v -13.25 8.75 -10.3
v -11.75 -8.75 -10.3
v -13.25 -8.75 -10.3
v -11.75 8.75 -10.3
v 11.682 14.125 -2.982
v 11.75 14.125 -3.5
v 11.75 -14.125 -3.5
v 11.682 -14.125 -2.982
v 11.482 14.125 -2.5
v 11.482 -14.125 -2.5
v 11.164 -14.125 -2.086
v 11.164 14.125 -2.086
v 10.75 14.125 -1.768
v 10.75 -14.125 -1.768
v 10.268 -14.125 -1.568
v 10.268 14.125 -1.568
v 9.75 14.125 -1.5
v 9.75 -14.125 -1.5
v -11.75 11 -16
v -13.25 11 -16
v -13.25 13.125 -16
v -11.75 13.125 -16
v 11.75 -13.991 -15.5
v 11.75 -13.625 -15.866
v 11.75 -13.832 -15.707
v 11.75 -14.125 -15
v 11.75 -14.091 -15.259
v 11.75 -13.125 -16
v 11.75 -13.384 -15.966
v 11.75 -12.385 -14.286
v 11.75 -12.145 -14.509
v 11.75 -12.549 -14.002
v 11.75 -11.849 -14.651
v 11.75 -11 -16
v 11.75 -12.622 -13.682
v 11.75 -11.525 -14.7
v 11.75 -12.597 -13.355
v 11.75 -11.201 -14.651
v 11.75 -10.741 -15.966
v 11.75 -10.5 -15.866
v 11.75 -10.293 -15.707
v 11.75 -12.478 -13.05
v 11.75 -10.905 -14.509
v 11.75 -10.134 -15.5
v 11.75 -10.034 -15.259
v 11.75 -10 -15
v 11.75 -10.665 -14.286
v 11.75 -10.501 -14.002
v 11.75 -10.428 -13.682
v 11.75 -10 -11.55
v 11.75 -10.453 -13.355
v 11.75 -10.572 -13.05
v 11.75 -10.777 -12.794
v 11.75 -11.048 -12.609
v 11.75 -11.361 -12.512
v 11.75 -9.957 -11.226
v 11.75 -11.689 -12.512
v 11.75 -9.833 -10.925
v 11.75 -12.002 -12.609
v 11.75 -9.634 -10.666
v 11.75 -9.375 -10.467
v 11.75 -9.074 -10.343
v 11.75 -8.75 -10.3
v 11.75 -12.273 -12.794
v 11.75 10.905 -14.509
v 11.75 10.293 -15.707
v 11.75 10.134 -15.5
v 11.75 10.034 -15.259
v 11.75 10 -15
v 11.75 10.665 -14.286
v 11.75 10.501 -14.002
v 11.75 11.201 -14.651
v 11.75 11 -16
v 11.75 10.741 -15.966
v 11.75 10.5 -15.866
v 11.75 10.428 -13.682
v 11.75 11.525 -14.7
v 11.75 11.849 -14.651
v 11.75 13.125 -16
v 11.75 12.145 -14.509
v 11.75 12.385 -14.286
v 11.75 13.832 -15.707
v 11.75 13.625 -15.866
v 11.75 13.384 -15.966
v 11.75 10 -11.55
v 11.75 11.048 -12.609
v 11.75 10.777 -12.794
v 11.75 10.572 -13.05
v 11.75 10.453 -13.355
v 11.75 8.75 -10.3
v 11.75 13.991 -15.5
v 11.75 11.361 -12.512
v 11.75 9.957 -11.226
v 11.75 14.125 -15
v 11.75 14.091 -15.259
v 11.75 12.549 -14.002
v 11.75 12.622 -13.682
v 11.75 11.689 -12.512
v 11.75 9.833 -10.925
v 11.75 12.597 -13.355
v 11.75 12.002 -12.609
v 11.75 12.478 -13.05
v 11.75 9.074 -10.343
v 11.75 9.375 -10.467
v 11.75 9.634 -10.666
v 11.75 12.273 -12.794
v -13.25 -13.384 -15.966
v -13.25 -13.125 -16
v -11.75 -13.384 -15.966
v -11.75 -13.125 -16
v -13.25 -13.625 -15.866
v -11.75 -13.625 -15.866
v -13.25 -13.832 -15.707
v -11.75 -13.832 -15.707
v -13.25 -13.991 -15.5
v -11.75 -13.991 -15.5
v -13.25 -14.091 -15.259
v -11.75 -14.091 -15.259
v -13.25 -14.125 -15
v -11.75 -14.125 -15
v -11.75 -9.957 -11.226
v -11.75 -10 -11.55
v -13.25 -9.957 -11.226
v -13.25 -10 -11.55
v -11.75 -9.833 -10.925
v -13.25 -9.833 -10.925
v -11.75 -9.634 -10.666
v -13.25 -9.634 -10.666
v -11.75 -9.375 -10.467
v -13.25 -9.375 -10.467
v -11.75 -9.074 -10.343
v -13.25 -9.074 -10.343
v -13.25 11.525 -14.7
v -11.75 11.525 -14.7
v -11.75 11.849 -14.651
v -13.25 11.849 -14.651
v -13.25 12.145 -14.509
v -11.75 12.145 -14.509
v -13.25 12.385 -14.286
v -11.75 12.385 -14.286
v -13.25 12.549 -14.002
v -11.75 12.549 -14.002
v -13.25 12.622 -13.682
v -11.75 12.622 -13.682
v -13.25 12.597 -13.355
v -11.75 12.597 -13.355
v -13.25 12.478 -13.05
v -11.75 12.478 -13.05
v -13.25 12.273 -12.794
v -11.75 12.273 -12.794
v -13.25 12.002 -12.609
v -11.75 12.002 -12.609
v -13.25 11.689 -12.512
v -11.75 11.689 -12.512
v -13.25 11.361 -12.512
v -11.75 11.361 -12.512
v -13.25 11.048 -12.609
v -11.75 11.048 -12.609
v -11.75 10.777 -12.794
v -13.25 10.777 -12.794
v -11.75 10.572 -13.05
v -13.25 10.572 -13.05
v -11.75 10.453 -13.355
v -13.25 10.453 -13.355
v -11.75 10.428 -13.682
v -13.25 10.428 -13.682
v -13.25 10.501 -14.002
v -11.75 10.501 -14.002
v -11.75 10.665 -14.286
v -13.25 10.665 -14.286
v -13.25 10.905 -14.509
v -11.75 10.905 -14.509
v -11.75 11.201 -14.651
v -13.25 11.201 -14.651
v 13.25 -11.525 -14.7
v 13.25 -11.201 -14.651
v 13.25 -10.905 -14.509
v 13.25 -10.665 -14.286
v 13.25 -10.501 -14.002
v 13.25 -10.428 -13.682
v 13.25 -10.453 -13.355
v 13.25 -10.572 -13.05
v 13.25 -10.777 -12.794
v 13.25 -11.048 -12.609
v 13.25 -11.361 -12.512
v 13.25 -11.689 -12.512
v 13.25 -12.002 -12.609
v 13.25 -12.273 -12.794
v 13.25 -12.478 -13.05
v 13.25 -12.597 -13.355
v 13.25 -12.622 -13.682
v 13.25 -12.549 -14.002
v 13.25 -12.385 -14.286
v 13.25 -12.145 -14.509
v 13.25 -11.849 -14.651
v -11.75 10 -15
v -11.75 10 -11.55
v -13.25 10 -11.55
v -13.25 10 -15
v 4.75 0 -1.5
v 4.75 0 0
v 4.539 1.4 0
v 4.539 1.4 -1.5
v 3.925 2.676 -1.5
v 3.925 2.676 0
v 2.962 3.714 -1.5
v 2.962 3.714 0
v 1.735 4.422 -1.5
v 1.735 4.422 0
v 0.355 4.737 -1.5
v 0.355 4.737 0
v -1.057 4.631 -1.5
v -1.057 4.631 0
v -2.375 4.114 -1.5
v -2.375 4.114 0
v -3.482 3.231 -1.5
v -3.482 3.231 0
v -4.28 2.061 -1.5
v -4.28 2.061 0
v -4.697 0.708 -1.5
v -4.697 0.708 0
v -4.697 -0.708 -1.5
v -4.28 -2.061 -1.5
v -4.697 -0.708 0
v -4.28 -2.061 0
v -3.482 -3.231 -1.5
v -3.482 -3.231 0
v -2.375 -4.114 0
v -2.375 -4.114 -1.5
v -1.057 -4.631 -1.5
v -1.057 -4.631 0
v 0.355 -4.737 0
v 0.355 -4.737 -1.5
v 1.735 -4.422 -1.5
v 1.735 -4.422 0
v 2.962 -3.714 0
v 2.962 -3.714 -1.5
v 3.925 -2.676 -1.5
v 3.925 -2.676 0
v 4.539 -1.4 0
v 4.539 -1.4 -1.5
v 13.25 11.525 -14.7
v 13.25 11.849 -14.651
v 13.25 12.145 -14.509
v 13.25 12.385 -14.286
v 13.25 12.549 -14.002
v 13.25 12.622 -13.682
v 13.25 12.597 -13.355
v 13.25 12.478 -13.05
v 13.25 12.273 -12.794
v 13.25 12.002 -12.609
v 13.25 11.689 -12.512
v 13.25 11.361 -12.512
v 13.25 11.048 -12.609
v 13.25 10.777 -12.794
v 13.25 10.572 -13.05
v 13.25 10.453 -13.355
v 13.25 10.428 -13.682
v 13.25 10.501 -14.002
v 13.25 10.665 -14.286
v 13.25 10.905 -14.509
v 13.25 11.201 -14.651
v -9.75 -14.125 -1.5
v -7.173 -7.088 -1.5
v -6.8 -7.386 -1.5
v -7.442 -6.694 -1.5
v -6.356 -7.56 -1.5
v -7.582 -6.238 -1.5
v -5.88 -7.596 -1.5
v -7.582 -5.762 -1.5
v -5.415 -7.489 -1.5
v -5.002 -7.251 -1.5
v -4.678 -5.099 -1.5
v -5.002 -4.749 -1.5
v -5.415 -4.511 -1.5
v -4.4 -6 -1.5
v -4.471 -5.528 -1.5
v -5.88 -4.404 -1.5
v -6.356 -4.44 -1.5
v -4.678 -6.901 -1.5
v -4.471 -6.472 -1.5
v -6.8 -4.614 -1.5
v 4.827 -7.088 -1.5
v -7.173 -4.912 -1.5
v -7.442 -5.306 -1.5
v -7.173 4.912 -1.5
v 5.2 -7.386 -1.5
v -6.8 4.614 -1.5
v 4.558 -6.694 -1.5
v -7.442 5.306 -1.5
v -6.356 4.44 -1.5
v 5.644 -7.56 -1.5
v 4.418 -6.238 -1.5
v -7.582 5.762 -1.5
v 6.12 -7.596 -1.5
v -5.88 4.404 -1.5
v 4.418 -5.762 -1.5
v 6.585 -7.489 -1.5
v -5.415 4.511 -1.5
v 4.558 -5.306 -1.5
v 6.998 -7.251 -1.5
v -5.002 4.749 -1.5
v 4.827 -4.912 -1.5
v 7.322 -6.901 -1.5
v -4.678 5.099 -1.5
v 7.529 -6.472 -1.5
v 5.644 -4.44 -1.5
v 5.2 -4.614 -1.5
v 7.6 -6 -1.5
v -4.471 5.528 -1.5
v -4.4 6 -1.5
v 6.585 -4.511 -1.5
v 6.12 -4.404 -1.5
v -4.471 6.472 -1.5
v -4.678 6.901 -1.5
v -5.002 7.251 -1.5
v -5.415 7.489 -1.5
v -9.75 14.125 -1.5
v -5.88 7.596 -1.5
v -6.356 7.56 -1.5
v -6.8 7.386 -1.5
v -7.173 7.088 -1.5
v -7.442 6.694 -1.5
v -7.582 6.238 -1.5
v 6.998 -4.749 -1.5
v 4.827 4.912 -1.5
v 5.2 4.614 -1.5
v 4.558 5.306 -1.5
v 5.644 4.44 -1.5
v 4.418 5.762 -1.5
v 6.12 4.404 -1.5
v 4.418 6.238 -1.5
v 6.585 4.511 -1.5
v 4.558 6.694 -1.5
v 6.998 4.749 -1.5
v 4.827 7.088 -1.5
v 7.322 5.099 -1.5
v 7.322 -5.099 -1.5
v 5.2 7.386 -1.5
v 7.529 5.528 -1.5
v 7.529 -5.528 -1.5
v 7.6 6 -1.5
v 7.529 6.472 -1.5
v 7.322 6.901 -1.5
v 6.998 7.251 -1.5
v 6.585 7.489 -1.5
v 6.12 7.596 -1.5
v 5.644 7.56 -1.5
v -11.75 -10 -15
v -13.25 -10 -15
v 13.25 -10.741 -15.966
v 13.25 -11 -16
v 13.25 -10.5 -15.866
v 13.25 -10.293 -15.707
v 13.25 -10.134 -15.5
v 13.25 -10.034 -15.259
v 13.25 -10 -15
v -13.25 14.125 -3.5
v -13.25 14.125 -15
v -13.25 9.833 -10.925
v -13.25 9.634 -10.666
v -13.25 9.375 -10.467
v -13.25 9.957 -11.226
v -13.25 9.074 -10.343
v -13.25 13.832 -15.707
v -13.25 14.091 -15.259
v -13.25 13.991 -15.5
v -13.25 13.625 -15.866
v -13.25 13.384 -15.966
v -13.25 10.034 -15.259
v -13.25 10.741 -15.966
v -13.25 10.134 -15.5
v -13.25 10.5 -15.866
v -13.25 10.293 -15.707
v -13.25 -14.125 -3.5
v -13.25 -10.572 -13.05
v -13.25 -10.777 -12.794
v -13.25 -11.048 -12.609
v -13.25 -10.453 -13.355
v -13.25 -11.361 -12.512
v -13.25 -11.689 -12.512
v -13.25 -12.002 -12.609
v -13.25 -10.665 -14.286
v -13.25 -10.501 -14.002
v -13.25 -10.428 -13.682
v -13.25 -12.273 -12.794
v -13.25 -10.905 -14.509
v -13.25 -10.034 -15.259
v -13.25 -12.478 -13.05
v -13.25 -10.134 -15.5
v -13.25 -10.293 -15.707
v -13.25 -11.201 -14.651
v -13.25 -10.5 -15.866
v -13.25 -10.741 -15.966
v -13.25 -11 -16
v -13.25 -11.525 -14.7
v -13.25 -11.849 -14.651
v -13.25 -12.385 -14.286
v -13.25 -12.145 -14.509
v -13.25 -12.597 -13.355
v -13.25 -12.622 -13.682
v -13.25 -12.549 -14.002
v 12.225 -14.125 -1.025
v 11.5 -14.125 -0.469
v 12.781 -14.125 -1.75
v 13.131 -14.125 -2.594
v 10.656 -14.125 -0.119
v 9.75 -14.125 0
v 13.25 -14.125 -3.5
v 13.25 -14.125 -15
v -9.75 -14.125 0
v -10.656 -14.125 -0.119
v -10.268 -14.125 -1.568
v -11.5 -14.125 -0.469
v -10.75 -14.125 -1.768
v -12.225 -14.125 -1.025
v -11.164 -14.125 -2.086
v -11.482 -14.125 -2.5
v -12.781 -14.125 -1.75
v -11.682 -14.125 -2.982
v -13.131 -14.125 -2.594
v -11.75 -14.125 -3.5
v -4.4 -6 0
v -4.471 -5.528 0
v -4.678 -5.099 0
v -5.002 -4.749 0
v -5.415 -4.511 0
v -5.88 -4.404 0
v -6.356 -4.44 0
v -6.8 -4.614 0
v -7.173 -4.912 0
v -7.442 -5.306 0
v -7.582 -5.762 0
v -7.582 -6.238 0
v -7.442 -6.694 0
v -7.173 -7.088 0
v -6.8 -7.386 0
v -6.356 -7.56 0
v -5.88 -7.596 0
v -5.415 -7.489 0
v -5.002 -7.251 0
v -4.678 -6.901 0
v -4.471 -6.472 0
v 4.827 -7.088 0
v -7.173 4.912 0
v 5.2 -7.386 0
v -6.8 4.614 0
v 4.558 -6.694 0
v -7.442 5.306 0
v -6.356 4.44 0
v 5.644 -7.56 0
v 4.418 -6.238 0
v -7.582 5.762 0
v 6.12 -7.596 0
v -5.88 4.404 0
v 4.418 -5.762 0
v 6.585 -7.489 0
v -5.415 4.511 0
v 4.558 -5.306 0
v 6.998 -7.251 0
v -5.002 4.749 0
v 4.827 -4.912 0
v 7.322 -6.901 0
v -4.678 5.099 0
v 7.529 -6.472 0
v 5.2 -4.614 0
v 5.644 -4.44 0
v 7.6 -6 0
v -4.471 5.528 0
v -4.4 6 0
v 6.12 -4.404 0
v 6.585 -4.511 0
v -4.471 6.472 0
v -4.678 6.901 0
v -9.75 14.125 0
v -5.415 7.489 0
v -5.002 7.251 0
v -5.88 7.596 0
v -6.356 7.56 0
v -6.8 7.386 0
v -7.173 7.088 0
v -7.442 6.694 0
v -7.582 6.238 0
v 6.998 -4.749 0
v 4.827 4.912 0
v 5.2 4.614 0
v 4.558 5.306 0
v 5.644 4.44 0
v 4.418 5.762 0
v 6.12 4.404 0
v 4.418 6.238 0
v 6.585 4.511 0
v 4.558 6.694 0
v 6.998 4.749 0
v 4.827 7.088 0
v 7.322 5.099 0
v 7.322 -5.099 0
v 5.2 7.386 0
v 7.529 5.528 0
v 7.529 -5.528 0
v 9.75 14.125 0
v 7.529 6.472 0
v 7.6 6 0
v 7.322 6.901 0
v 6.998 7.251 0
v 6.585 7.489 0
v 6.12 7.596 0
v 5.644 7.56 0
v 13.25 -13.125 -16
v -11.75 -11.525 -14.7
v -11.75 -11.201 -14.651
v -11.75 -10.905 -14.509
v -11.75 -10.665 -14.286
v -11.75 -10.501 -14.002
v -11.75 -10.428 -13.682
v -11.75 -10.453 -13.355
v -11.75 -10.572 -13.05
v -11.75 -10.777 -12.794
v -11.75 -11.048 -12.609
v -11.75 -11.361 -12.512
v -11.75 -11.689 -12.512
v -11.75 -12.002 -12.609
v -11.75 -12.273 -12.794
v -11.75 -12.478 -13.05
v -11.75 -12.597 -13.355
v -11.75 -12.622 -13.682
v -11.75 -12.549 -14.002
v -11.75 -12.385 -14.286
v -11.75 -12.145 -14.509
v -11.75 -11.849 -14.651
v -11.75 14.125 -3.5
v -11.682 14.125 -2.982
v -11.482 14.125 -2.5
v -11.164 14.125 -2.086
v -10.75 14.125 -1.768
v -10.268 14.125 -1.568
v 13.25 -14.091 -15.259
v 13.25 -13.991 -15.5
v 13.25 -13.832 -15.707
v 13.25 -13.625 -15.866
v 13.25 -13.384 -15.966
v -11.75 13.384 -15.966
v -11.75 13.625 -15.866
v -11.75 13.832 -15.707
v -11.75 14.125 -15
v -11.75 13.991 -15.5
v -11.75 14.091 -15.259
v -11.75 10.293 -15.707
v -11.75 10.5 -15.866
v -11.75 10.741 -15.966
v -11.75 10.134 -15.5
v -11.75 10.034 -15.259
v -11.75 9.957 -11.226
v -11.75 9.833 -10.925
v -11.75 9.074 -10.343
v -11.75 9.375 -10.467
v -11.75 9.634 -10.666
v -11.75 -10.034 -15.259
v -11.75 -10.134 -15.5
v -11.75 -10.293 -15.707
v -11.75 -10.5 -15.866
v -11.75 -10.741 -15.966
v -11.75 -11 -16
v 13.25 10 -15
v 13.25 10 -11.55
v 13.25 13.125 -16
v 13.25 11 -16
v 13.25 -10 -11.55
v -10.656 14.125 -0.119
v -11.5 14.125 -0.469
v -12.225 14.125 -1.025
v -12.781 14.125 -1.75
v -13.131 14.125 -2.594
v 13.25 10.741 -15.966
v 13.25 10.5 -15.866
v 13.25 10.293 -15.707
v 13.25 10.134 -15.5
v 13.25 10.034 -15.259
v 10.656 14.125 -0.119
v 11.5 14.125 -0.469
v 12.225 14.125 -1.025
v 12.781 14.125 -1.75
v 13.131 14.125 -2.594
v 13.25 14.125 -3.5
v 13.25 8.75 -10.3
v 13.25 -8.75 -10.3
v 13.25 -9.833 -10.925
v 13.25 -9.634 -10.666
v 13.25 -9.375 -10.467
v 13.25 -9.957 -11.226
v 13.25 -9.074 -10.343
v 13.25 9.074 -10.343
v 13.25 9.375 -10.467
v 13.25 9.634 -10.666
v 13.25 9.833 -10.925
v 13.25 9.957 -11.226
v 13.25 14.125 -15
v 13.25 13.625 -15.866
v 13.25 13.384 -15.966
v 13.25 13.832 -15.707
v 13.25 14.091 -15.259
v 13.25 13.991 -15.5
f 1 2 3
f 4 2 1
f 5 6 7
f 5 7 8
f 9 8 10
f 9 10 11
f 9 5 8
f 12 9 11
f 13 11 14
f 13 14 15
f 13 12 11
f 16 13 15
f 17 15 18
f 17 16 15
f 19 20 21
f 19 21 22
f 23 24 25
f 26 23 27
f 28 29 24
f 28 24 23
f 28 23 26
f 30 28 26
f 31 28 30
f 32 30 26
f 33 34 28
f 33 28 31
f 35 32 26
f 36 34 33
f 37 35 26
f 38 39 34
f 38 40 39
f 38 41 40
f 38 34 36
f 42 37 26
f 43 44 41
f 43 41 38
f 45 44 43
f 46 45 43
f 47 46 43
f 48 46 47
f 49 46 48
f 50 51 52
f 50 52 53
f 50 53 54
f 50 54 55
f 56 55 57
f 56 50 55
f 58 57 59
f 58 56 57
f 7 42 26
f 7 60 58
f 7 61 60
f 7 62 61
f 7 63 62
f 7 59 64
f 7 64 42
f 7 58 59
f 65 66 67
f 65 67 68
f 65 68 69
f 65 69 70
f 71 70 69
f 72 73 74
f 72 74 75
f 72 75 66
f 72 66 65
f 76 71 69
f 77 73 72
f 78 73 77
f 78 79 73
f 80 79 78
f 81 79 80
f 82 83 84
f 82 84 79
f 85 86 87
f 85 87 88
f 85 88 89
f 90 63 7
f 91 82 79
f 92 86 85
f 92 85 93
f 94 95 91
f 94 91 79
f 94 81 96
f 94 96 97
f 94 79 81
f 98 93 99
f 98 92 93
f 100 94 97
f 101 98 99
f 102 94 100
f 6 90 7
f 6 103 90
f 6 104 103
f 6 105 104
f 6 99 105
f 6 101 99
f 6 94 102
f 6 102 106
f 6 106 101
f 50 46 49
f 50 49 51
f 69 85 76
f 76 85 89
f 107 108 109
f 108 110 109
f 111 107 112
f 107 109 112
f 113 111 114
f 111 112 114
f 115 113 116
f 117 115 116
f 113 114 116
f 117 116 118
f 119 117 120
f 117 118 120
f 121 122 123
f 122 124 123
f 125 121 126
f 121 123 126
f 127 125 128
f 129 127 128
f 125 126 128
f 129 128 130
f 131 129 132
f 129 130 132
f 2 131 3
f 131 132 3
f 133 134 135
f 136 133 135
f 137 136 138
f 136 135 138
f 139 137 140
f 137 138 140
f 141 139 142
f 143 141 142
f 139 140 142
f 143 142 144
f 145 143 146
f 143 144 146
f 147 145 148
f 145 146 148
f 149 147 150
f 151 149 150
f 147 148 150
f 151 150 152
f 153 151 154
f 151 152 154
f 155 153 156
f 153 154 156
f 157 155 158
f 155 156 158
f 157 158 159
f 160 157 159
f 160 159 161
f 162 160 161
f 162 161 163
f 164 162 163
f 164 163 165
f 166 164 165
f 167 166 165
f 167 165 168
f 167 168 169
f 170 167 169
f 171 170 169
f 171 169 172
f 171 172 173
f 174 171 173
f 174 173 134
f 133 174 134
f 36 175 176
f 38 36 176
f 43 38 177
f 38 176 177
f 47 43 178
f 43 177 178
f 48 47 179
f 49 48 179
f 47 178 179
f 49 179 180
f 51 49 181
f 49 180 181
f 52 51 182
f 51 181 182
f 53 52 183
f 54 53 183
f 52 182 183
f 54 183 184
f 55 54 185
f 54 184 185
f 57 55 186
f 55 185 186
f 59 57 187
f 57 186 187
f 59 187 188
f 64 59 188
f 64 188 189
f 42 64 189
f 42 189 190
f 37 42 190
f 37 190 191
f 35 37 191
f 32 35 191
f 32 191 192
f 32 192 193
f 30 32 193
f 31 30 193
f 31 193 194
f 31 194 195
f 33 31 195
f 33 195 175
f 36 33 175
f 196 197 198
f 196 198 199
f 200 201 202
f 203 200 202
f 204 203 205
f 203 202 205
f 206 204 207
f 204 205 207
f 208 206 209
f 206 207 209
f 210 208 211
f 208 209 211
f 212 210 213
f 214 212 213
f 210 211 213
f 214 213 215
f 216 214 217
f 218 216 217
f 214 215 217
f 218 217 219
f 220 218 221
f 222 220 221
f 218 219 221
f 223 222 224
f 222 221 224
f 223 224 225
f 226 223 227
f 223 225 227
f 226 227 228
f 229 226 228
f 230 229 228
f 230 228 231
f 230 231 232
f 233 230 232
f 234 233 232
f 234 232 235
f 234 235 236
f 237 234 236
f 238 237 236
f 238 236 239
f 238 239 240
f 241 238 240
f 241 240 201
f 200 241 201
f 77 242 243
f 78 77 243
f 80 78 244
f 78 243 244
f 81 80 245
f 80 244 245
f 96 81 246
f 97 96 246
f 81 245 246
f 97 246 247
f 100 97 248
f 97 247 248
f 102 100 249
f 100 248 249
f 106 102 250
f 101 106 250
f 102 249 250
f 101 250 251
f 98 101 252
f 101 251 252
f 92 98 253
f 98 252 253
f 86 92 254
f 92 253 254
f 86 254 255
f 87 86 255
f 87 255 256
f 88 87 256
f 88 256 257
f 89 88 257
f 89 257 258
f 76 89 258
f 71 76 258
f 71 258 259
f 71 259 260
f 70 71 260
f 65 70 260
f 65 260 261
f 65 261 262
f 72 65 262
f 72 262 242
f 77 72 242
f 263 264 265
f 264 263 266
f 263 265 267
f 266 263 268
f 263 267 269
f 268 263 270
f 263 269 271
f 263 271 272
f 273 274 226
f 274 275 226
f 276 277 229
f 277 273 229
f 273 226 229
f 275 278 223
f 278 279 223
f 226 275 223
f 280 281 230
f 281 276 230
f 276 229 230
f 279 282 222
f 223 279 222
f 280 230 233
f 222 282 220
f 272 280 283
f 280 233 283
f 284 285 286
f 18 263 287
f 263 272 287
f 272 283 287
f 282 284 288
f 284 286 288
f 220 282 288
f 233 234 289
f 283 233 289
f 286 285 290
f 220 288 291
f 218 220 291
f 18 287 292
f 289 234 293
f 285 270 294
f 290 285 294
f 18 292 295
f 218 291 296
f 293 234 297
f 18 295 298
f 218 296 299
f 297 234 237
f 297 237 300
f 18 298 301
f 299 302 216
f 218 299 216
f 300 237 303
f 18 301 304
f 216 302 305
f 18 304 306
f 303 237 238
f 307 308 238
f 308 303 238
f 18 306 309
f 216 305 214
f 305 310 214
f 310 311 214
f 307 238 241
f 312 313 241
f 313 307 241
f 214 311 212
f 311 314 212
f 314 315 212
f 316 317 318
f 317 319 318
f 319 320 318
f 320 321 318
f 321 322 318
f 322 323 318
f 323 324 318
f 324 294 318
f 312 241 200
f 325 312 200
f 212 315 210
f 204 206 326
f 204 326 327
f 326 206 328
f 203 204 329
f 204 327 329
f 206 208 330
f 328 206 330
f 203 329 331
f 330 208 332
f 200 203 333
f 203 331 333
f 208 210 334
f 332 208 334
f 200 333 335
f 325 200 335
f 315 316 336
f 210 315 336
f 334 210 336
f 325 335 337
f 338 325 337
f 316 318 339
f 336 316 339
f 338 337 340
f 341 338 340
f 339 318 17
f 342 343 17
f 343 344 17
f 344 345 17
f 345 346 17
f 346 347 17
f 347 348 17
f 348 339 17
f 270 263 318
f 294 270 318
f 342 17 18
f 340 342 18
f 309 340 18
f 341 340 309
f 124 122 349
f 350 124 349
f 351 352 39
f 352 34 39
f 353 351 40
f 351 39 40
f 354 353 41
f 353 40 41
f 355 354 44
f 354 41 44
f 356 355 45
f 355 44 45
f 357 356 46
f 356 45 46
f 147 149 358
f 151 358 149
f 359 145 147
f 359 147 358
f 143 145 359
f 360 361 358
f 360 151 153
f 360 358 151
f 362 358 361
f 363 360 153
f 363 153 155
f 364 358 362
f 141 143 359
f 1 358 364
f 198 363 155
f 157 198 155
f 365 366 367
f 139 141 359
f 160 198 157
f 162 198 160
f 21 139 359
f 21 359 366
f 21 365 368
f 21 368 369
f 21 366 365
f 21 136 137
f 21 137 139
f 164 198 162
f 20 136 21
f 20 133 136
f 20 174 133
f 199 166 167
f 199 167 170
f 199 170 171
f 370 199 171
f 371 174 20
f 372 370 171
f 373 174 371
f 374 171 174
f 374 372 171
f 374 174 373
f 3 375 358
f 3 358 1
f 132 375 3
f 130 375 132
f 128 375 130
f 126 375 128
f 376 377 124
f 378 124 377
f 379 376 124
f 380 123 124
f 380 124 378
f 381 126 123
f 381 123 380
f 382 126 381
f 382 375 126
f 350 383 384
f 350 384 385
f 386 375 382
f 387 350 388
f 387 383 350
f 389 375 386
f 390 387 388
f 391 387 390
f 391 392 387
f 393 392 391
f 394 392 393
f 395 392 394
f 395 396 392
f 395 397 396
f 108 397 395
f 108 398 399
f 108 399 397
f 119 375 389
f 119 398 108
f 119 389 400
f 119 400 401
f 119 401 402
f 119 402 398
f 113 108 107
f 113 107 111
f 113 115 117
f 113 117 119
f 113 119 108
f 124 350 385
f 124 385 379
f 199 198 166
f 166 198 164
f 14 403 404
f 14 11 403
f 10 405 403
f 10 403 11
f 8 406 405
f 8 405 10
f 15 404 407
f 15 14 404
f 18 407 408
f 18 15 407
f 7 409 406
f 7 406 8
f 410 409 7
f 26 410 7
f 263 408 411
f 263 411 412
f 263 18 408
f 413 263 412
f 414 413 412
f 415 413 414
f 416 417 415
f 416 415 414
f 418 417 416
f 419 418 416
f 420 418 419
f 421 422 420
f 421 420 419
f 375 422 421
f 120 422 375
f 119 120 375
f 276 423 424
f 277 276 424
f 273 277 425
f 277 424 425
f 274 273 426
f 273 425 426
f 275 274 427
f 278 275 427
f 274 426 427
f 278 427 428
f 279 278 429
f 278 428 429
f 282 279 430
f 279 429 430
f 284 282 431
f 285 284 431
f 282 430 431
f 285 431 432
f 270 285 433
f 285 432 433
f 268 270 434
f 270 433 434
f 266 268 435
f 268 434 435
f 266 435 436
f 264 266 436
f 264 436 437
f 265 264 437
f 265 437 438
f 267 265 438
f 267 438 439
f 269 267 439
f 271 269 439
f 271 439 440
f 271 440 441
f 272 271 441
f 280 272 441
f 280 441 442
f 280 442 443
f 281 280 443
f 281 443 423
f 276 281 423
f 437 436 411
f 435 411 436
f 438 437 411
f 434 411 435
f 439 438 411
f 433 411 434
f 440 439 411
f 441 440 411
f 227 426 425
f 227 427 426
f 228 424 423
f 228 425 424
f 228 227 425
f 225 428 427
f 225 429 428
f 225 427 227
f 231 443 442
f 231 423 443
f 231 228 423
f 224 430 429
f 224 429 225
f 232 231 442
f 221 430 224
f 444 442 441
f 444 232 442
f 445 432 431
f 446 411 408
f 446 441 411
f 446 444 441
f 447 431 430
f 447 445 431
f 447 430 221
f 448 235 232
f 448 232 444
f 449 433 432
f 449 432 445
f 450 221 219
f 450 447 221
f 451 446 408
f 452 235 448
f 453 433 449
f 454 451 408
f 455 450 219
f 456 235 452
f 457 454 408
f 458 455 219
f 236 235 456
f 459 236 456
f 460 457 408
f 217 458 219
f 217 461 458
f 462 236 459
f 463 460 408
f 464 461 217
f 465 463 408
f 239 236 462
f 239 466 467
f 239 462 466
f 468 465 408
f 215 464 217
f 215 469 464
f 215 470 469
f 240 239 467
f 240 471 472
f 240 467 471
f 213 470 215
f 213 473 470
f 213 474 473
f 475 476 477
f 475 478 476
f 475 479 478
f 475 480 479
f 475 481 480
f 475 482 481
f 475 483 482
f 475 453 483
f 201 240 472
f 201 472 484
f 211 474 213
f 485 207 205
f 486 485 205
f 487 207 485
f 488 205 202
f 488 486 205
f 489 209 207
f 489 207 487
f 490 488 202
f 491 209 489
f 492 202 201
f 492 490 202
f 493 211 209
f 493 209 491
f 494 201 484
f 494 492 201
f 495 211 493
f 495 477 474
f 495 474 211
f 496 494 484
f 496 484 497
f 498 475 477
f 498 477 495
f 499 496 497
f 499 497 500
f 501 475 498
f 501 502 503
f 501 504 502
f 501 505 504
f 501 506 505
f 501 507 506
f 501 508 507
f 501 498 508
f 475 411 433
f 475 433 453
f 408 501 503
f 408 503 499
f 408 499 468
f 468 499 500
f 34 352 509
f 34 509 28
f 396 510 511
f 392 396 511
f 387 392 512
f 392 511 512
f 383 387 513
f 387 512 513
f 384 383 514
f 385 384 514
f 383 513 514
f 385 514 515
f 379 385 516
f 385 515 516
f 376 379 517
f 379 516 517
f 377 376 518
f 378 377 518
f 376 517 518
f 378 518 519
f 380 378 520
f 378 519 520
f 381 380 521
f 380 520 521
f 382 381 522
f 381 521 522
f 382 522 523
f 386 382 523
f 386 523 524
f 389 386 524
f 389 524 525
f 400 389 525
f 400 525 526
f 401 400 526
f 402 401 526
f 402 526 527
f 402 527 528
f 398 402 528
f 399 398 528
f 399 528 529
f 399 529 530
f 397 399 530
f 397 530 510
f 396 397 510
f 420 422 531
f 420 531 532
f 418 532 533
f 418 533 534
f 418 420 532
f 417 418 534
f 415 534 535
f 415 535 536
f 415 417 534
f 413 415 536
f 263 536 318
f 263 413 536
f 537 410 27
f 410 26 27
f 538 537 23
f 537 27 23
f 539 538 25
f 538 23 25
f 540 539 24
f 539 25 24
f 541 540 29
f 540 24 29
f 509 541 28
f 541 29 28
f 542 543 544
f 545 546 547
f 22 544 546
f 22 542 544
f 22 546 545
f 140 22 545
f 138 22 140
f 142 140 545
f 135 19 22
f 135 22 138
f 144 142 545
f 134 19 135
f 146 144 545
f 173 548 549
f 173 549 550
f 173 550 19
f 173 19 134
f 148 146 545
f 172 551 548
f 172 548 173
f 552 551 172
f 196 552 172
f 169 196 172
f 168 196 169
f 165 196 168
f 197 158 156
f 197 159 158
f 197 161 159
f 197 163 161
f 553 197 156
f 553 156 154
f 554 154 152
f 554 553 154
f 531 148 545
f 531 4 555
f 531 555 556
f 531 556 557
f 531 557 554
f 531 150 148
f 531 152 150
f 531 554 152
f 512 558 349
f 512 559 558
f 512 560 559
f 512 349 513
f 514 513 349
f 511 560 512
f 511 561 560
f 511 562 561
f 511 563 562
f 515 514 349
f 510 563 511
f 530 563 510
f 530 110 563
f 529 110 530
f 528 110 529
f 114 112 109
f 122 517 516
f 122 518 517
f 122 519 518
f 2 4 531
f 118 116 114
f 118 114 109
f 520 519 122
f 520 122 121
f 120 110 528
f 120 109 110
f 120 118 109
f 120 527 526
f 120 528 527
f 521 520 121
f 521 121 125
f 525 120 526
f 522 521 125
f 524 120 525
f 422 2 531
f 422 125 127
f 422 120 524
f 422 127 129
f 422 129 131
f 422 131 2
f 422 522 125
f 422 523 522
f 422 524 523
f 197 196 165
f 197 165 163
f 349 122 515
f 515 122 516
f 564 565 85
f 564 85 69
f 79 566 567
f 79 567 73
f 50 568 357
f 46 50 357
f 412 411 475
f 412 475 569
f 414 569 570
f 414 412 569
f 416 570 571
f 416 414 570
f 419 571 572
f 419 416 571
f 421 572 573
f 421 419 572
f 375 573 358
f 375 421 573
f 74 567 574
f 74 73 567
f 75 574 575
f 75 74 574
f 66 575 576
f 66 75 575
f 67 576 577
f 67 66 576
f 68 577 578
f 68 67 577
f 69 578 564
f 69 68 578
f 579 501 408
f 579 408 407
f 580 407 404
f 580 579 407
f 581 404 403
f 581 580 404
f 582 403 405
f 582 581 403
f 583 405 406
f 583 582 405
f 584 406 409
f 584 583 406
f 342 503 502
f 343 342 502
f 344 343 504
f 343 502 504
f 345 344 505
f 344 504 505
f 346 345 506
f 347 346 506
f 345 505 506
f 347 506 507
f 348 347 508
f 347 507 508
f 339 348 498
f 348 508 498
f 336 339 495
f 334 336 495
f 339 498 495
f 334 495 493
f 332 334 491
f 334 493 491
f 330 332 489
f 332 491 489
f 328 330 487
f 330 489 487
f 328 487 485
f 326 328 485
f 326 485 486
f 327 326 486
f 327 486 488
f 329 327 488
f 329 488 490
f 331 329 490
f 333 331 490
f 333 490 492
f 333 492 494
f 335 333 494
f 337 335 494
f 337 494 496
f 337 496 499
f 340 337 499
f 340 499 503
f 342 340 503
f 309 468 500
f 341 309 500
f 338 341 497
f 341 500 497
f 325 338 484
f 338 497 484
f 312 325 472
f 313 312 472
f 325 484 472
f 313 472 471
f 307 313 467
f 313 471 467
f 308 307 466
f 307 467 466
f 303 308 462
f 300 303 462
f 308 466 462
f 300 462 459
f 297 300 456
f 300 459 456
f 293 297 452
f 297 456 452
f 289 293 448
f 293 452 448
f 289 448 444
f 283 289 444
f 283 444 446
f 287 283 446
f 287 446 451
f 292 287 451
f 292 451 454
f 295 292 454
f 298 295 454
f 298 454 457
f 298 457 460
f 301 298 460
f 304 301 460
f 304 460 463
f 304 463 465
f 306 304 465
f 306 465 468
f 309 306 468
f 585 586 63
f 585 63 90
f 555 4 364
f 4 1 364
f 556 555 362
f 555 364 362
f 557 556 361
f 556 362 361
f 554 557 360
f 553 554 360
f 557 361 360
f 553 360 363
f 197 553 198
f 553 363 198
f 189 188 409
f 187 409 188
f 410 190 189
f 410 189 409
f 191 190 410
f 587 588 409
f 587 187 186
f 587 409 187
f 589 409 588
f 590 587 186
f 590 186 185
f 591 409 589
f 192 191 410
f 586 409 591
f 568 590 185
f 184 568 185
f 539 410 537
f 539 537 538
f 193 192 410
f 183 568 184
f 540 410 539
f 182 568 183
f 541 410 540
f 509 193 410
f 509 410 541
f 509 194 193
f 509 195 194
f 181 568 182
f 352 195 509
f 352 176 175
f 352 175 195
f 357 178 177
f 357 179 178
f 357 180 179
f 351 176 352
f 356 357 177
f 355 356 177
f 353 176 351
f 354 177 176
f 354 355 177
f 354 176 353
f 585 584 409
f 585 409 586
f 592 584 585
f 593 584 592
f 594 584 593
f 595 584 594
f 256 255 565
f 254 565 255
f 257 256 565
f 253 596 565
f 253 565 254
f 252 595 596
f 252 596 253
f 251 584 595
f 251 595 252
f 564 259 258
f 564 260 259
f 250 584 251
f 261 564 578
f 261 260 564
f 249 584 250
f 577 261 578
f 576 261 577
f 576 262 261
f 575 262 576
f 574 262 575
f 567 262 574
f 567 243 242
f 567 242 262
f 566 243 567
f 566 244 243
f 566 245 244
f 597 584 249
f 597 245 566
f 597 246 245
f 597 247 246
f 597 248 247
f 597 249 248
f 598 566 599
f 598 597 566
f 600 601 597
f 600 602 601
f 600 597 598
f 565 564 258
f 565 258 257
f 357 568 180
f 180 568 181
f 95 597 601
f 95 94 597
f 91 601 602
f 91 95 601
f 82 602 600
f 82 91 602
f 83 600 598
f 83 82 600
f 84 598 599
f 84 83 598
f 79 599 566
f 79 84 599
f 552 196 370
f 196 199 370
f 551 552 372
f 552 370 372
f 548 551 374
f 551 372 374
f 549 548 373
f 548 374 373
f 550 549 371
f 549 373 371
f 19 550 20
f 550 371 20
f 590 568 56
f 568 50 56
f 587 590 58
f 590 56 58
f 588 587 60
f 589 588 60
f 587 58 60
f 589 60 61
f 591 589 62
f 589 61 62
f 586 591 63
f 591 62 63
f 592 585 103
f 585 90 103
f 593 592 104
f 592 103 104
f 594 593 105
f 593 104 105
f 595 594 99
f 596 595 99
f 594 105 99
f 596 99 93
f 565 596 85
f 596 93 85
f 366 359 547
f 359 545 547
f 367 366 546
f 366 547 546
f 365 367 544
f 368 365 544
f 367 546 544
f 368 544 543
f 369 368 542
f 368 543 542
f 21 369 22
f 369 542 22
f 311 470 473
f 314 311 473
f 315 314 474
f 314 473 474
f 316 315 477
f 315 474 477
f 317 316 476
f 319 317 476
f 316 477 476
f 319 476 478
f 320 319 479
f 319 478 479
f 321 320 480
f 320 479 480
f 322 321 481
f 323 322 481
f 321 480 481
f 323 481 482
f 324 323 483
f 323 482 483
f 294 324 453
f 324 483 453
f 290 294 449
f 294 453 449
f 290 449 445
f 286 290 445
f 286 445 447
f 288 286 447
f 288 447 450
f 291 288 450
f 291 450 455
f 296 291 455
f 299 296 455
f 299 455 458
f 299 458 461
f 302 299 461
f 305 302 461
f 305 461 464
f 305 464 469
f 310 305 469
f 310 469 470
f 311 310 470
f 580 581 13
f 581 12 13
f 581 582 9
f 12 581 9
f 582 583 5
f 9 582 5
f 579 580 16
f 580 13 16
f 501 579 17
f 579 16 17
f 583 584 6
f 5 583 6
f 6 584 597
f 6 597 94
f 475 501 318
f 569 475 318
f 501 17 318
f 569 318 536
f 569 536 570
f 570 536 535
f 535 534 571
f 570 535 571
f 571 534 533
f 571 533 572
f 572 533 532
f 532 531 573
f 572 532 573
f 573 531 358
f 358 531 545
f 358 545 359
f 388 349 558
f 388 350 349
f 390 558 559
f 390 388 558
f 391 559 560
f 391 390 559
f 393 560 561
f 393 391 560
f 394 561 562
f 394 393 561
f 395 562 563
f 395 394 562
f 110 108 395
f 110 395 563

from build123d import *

# Parameters (mm, degrees)
SKETCH1_W                      = 23.5
SKETCH1_H                      = 28.25
BASE_FLANGE1_DEPTH             = 1.5
EDGE_FLANGE1_STRIP_W           = 10
EDGE_FLANGE1_STRIP_H           = 1.5
EDGE_FLANGE1_STRIP_CUT_DEPTH   = 28.25
EDGE_FLANGE1_STRIP_2_W         = 10
EDGE_FLANGE1_STRIP_2_H         = 1.5
EDGE_FLANGE1_STRIP_CUT_2_DEPTH = 28.25
EDGE_FLANGE1_DEPTH             = 28.25
EDGE_FLANGE1_BEND_DEPTH        = 28.25
SKETCH12_R                     = 1.6
SKETCH12_R_2                   = 4.75
CUT_EXTRUDE1_DEPTH             = 26.12126838
SKETCH13_R                     = 1.1
SKETCH13_W                     = 29.65
SKETCH13_H                     = 20
CUT_EXTRUDE2_DEPTH             = 35.025955167
FILLET1_R                      = 1.25
FILLET2_R                      = 1


# Sheet-metal steps are written as plain solids
with BuildPart() as part:
    # Sketch1 → Base-Flange1 (new body)
    with BuildSketch(Plane.XY):
        Rectangle(SKETCH1_W, SKETCH1_H)
    extrude(amount=-BASE_FLANGE1_DEPTH)

    # Edge-Flange1 strip (across the edge) → Edge-Flange1 strip cut (cut)
    with BuildSketch(Plane(origin=(11.75, 14.125, -1.5), x_dir=(-1, 0, 0), z_dir=(0, -1, 0))):
        with Locations((-3, -0.75)):
            Rectangle(EDGE_FLANGE1_STRIP_W, EDGE_FLANGE1_STRIP_H)
    extrude(amount=EDGE_FLANGE1_STRIP_CUT_DEPTH, mode=Mode.SUBTRACT)

    # Edge-Flange1 strip 2 (across the edge) → Edge-Flange1 strip cut 2 (cut)
    with BuildSketch(Plane(origin=(-11.75, -14.125, -1.5), x_dir=(1, 0, 0), z_dir=(0, 1, 0))):
        with Locations((-3, -0.75)):
            Rectangle(EDGE_FLANGE1_STRIP_2_W, EDGE_FLANGE1_STRIP_2_H)
    extrude(amount=EDGE_FLANGE1_STRIP_CUT_2_DEPTH, mode=Mode.SUBTRACT)

    # Edge-Flange1 section (across the edge) → Edge-Flange1 (add)
    with BuildSketch(Plane(origin=(11.75, 14.125, -1.5), x_dir=(-1, 0, 0), z_dir=(0, -1, 0))):
        with BuildLine():
            Line((-1.5, 2), (-1.5, 14.5))
            Line((-1.5, 14.5), (0, 14.5))
            Line((0, 14.5), (0, 2))
            ThreePointArc((0, 2), (0.585786438, 0.585786438), (2, 0))
            Line((2, 0), (2, -1.5))
            ThreePointArc((2, -1.5), (-0.474873734, -0.474873734), (-1.5, 2))
        make_face()
    extrude(amount=EDGE_FLANGE1_DEPTH)

    # Edge-Flange1 section 2 (across the edge) → Edge-Flange1 bend (add)
    with BuildSketch(Plane(origin=(-11.75, -14.125, -1.5), x_dir=(1, 0, 0), z_dir=(0, 1, 0))):
        with BuildLine():
            Line((-1.5, 2), (-1.5, 14.5))
            Line((-1.5, 14.5), (0, 14.5))
            Line((0, 14.5), (0, 2))
            ThreePointArc((0, 2), (0.585786438, 0.585786438), (2, 0))
            Line((2, 0), (2, -1.5))
            ThreePointArc((2, -1.5), (-0.474873734, -0.474873734), (-1.5, 2))
        make_face()
    extrude(amount=EDGE_FLANGE1_BEND_DEPTH)

    # Sketch12 → Cut-Extrude1 (cut, through all)
    with BuildSketch(Plane.XY):
        with Locations((-6, 6)):
            Circle(SKETCH12_R)
        with Locations((6, 6)):
            Circle(SKETCH12_R)
        with Locations((6, -6)):
            Circle(SKETCH12_R)
        with Locations((-6, -6)):
            Circle(SKETCH12_R)
        Circle(SKETCH12_R_2)
    extrude(amount=-CUT_EXTRUDE1_DEPTH, mode=Mode.SUBTRACT)

    # Sketch13 → Cut-Extrude2 (cut, through all)
    with BuildSketch(Plane(origin=(13.25, 0, 0), x_dir=(0, 0, -1), z_dir=(1, 0, 0))):
        with Locations((13.6, 11.525)):
            Circle(SKETCH13_R)
        with Locations((13.6, -11.525)):
            Circle(SKETCH13_R)
        with Locations((25.125, 0)):
            Rectangle(SKETCH13_W, SKETCH13_H)
    extrude(amount=-CUT_EXTRUDE2_DEPTH, mode=Mode.SUBTRACT)

    # Fillet1
    fillet1_edges = [part.edges().sort_by_distance(p)[0] for p in [
        (12.5, -10, -10.3),
        (12.5, 10, -10.3),
        (-12.5, -10, -10.3),
        (-12.5, 10, -10.3),
    ]]
    fillet(fillet1_edges, radius=FILLET1_R)

    # Fillet2
    fillet2_edges = [part.edges().sort_by_distance(p)[0] for p in [
        (-12.5, 10, -16),
        (-12.5, -10, -16),
        (12.5, -10, -16),
        (12.5, 10, -16),
        (12.5, 14.125, -16),
        (12.5, -14.125, -16),
        (-12.5, -14.125, -16),
        (-12.5, 14.125, -16),
    ]]
    fillet(fillet2_edges, radius=FILLET2_R)


solid = part.part
